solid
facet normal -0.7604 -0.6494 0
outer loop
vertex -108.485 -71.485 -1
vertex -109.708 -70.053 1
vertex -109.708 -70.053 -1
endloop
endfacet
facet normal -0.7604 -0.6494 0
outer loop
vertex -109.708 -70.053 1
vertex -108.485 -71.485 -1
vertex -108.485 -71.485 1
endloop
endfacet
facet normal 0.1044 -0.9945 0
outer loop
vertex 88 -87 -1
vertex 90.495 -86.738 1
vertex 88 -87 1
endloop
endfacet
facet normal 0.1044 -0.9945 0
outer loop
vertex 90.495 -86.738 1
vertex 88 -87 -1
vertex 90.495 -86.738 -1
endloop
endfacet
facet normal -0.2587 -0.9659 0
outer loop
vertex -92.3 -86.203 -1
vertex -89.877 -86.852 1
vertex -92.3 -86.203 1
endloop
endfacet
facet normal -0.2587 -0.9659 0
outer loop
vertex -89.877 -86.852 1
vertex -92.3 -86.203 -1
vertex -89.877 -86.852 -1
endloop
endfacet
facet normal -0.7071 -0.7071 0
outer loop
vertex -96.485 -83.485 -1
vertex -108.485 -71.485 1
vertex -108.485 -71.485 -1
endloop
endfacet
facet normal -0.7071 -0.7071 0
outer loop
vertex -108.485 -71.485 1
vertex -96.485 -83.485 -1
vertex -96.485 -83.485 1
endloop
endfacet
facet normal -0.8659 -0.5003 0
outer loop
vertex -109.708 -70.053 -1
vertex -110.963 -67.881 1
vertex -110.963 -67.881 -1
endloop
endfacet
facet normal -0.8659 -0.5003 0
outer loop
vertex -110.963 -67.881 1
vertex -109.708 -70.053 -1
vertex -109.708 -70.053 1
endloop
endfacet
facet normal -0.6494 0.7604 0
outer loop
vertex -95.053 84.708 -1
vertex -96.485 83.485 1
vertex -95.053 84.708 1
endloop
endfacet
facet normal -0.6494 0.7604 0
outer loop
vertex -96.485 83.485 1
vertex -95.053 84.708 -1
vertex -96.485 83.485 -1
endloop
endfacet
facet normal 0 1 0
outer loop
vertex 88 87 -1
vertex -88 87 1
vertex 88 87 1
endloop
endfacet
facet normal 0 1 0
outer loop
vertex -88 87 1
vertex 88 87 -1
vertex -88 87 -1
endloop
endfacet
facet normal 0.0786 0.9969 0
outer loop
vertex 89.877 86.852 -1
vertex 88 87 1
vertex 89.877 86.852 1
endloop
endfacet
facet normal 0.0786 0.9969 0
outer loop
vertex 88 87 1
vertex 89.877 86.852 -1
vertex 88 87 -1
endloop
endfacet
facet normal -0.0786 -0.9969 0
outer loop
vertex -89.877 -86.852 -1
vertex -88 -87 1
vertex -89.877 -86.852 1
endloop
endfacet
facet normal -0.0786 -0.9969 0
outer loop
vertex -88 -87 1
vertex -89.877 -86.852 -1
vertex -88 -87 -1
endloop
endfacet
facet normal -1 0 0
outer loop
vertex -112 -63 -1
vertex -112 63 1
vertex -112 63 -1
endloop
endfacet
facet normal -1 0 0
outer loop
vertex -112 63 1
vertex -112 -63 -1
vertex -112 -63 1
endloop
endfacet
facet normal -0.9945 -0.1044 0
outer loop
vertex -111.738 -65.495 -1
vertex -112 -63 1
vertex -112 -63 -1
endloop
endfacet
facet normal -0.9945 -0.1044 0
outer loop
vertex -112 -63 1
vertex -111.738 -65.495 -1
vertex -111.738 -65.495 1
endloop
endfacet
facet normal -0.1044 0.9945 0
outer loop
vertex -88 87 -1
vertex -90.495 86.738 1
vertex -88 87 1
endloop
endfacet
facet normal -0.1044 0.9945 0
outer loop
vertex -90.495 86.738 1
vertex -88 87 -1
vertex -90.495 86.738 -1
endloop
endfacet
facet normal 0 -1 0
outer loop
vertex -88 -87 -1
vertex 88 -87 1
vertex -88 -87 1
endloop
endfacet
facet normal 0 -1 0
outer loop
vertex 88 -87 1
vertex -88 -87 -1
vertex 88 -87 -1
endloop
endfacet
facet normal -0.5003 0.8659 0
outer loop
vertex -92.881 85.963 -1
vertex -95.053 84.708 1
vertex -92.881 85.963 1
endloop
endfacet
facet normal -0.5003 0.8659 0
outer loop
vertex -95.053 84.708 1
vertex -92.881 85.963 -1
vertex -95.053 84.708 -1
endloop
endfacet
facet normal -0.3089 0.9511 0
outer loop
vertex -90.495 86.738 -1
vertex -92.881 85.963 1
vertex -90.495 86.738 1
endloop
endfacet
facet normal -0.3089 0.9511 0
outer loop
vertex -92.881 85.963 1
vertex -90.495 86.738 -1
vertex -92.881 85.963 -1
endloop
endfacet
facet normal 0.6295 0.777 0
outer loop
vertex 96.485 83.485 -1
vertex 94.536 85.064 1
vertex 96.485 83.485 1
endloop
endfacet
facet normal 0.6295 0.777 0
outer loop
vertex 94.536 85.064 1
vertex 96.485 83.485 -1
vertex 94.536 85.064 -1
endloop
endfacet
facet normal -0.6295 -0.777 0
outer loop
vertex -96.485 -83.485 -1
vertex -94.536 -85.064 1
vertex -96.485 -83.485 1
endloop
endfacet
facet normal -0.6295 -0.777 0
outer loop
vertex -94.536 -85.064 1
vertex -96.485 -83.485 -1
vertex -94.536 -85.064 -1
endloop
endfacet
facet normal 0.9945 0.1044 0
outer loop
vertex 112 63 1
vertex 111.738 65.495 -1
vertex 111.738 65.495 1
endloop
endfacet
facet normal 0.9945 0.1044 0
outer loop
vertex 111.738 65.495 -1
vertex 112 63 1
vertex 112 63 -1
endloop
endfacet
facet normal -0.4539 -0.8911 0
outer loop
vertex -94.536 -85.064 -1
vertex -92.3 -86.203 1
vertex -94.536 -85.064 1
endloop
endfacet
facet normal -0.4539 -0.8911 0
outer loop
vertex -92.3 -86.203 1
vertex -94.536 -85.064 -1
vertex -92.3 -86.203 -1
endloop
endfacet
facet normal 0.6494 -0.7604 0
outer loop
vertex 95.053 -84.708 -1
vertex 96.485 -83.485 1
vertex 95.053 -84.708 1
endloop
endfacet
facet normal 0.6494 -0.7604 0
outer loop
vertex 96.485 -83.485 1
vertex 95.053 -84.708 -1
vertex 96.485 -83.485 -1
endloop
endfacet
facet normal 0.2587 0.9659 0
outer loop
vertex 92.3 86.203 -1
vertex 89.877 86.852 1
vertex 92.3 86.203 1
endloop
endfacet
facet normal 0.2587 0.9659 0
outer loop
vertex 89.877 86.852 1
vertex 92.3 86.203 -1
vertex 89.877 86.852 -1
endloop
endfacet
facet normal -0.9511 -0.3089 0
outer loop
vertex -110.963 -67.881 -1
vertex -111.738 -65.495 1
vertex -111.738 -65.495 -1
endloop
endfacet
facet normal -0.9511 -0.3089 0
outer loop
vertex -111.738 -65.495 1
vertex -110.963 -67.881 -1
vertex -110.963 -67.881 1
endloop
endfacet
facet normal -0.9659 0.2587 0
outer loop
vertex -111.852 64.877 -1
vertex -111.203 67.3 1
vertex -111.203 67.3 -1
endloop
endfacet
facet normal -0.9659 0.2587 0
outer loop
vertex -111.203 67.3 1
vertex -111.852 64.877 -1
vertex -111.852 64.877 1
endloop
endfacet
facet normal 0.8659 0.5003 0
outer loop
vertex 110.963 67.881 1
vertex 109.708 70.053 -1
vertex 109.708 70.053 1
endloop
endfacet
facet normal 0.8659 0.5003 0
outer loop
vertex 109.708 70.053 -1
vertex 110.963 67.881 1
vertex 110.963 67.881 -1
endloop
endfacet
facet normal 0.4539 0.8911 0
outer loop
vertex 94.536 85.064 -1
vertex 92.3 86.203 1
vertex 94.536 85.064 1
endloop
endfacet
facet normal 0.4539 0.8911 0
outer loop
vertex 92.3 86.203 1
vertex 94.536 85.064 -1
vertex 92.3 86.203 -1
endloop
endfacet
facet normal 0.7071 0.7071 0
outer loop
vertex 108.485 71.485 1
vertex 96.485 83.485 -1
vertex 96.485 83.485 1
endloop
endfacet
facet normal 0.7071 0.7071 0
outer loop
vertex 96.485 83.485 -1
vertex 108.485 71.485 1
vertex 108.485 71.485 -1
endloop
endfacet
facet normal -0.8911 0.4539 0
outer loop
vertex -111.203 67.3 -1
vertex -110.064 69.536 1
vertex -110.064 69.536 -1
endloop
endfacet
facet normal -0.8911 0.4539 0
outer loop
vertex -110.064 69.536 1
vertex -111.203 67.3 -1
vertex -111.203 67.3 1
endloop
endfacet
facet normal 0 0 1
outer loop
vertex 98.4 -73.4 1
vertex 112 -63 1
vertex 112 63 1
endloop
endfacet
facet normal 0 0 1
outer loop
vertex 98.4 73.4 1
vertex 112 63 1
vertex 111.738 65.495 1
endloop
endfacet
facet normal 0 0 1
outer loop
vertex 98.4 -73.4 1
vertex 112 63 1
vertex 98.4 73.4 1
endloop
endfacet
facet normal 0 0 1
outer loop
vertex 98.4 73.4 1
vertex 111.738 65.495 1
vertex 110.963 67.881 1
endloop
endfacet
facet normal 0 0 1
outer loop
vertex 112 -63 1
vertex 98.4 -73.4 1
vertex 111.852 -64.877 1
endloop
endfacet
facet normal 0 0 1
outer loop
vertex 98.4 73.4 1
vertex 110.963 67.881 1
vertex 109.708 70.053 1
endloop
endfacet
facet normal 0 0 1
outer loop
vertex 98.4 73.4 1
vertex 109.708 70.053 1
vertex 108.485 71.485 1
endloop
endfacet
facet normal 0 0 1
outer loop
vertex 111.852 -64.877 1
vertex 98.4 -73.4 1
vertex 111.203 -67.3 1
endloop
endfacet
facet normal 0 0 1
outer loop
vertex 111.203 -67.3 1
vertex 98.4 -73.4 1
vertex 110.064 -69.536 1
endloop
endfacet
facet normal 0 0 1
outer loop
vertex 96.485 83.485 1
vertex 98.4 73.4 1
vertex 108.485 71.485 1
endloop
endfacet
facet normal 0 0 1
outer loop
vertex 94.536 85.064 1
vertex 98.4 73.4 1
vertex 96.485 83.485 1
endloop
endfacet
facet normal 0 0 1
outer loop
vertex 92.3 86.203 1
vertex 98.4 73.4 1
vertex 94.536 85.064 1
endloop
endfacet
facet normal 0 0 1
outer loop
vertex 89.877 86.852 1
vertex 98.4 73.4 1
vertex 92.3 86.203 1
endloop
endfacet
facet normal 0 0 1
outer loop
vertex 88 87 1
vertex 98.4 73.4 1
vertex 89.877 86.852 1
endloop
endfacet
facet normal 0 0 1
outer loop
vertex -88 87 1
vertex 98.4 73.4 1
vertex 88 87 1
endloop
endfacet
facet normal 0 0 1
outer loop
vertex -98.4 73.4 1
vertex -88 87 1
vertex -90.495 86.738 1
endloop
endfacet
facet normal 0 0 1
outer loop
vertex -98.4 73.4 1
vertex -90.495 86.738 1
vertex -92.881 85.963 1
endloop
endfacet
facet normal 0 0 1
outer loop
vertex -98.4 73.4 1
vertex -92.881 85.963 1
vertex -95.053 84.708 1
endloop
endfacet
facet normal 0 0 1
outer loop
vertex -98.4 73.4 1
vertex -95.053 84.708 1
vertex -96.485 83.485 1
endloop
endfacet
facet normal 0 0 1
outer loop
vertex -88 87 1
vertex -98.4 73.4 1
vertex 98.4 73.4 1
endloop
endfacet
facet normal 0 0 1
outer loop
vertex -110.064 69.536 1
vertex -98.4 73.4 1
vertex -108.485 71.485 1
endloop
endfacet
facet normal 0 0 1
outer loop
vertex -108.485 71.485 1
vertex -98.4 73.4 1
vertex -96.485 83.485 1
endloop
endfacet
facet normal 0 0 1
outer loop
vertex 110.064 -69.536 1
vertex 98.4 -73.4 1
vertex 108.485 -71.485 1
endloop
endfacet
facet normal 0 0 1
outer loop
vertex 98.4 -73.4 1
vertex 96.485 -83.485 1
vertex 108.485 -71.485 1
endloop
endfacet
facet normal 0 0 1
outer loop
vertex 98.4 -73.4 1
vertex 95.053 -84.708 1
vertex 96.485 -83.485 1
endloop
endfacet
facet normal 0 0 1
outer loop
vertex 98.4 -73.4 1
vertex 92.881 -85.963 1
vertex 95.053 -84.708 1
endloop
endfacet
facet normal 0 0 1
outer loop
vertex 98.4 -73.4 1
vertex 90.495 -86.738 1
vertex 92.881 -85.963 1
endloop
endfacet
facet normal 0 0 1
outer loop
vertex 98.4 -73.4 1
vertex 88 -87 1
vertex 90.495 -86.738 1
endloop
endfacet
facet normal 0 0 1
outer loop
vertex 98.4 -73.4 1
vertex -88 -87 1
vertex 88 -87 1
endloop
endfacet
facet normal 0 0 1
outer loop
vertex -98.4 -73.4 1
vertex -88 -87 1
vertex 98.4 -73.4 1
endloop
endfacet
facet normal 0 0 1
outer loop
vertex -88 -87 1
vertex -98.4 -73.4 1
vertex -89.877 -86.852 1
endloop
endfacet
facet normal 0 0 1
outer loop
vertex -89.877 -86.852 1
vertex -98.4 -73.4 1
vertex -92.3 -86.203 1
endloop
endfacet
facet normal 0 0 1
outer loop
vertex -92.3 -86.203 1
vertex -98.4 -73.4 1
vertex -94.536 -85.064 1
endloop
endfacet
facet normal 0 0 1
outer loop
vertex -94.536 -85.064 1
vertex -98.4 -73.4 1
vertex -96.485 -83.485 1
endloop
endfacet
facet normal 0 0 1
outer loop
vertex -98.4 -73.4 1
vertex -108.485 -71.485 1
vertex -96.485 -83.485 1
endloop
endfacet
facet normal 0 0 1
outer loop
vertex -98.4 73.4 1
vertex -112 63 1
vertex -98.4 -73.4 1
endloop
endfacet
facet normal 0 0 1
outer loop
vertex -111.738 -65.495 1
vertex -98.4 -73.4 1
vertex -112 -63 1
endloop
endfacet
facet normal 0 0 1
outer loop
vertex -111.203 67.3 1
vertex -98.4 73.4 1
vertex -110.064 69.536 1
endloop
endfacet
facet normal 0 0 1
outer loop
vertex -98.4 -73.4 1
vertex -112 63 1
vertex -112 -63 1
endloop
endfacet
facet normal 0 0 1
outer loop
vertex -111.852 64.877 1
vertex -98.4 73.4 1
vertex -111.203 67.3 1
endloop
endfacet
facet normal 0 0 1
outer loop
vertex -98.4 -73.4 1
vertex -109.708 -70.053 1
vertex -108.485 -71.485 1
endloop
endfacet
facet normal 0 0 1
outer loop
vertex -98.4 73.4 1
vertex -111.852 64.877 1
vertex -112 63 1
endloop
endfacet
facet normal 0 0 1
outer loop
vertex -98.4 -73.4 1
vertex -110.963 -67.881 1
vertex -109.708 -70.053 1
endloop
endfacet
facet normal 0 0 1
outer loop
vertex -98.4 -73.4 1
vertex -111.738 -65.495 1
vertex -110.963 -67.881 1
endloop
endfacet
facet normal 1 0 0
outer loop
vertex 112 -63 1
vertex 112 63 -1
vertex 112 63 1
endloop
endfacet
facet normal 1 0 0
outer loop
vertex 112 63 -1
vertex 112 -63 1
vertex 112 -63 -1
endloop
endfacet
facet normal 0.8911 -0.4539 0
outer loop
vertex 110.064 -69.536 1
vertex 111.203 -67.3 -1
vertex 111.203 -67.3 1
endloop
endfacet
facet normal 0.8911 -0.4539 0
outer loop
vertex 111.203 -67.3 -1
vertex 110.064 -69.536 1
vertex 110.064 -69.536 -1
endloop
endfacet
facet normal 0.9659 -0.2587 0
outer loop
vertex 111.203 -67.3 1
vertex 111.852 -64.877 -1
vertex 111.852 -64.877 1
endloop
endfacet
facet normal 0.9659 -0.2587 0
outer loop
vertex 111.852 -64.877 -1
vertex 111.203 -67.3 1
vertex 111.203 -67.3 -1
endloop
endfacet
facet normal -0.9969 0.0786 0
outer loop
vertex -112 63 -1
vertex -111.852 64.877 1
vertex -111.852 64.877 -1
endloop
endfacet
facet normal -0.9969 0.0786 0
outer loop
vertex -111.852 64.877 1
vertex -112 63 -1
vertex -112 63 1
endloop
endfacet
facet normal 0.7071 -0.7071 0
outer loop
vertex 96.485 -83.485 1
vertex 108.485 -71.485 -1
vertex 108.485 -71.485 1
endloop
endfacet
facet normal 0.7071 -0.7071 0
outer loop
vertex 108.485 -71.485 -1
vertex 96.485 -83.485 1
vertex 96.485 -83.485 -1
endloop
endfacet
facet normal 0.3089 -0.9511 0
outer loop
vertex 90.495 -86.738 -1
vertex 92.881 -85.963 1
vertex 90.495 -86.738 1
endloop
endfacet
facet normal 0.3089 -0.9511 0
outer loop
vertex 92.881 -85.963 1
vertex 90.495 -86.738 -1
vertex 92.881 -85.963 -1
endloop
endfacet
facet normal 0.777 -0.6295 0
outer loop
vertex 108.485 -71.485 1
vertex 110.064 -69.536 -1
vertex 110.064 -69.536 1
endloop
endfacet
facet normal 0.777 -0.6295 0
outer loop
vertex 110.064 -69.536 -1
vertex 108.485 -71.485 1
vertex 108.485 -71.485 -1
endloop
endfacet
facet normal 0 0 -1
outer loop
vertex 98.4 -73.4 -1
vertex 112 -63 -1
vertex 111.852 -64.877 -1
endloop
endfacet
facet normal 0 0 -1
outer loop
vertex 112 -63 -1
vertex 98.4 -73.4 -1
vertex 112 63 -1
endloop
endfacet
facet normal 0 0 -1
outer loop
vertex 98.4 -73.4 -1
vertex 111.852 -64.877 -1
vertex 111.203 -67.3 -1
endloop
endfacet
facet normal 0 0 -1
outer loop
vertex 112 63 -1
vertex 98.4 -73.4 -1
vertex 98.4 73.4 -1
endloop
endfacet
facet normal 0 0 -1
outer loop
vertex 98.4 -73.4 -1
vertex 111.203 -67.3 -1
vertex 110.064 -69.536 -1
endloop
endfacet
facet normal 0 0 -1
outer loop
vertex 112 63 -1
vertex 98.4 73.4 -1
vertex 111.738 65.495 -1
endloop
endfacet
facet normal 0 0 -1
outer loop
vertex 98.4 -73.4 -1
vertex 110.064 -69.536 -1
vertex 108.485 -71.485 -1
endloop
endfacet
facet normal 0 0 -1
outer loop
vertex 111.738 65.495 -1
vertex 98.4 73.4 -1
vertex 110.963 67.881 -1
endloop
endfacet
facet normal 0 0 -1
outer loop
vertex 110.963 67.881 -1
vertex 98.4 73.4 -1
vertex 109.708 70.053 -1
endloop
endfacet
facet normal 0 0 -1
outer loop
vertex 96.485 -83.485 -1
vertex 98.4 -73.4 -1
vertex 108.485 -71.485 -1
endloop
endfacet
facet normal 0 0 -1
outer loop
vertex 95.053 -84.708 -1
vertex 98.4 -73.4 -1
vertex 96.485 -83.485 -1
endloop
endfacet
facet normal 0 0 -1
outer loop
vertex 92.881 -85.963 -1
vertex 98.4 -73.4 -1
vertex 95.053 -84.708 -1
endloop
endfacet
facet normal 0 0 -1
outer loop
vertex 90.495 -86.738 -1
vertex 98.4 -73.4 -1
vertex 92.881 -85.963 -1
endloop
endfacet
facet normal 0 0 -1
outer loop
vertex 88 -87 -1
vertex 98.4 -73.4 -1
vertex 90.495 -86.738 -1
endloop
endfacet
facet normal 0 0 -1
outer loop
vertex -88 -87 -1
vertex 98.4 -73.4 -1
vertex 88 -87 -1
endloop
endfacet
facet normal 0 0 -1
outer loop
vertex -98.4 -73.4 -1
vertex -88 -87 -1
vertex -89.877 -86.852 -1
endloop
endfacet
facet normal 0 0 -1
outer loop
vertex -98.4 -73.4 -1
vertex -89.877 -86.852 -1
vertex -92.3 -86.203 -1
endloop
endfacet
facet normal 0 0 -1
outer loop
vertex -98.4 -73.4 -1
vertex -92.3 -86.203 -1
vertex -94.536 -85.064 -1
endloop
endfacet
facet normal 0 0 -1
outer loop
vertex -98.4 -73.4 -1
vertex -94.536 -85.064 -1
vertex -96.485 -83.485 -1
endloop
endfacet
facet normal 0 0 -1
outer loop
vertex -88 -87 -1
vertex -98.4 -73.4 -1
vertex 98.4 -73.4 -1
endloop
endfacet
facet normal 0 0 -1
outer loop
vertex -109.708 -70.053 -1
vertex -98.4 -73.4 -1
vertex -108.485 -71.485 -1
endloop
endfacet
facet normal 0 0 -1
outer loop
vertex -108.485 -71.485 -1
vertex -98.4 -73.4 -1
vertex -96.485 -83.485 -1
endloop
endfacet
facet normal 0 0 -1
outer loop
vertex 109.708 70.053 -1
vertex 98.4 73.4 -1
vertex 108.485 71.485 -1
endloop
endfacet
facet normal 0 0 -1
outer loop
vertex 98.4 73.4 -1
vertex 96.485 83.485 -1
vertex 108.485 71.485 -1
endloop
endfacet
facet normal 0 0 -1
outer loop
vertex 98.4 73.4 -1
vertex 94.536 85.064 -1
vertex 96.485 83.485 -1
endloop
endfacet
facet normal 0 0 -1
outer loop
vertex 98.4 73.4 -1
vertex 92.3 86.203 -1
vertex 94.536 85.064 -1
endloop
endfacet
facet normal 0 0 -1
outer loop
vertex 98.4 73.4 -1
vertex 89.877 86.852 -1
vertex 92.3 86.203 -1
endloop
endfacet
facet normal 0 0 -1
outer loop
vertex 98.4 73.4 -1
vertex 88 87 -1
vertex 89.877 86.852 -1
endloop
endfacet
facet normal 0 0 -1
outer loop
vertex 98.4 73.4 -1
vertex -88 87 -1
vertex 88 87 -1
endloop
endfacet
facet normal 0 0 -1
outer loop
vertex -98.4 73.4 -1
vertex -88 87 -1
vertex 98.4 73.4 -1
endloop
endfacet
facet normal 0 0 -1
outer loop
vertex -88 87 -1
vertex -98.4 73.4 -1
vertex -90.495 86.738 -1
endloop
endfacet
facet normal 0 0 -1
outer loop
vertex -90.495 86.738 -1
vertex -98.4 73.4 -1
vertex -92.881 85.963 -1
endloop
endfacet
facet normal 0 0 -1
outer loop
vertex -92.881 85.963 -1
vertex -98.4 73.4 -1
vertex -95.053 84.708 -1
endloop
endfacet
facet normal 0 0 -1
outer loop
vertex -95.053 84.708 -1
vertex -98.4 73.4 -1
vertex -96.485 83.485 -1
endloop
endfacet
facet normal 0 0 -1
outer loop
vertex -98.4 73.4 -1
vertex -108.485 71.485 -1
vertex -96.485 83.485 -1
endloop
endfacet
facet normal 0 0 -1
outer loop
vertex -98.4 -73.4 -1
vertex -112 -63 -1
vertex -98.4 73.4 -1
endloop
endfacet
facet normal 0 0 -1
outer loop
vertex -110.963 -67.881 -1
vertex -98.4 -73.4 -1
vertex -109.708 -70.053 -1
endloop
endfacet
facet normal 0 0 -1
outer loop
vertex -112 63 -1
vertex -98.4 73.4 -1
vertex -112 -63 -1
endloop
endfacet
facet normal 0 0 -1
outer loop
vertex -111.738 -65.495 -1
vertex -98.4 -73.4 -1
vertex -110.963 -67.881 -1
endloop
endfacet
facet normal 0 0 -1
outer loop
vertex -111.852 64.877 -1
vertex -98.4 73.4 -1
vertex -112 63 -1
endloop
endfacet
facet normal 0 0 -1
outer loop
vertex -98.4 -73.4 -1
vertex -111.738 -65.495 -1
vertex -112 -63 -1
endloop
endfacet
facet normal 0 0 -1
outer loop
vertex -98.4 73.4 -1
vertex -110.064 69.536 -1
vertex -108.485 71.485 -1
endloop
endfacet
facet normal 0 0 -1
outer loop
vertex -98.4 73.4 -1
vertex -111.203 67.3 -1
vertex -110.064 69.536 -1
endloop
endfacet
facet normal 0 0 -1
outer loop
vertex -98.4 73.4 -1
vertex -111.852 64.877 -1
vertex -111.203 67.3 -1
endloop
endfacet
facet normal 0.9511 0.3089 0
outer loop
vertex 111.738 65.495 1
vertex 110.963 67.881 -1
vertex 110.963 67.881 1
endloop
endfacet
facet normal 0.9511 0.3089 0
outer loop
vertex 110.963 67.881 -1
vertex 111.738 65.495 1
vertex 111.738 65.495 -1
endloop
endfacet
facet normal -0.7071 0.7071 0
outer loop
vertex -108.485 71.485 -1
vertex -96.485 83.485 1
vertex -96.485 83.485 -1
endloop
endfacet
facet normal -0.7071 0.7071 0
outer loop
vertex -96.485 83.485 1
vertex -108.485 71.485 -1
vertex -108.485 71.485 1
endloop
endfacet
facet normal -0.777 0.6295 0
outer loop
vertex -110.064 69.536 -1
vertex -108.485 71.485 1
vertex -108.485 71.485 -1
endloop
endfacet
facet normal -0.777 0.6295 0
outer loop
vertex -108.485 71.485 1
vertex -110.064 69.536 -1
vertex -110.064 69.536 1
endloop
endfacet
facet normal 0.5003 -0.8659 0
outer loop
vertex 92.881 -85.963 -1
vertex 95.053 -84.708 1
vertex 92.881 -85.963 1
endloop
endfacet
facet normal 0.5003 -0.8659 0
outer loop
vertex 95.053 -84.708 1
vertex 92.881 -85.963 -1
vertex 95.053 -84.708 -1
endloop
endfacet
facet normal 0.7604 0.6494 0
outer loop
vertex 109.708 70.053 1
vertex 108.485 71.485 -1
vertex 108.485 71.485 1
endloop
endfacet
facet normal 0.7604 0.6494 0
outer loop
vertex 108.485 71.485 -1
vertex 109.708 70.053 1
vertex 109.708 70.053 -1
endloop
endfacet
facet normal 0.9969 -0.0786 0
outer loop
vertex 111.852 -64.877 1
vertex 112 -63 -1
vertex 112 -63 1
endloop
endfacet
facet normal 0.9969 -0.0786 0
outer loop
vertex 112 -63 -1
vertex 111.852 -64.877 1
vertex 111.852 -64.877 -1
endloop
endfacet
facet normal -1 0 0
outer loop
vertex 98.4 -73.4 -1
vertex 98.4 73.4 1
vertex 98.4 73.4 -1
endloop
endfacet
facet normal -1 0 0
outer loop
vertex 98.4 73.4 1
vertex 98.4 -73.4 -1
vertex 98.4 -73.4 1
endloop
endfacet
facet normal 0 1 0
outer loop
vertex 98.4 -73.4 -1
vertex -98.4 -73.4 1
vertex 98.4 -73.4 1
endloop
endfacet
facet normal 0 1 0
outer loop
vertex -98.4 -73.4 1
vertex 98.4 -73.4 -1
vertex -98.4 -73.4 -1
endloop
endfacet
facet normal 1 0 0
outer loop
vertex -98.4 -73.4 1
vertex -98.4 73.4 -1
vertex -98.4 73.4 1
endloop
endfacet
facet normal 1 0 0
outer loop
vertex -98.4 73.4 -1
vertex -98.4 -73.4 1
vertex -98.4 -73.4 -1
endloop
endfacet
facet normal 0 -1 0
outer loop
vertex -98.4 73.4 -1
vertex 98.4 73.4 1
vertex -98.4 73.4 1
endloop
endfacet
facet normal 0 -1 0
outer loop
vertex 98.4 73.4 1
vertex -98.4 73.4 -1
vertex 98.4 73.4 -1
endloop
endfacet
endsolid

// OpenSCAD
// Parameters
sheet_length = 200; //[100:400:1]
sheet_width = 150; //[75:300:1]
sheet_thickness = 2; //[1:6:0.5]
corner_radius = 12; //[6:24:1]
hole_diameter = 6; //[3:12:0.5]
hole_edge_offset = 15; //[8:30:1]
chamfer_size = 0.8; //[0.3:2:0.1]
overlap = 1; //[0.5:2:0.1]

// Base Shapes
module sheet_body() {
  color("Silver")
  translate([0, 0, 0])
    cube([sheet_length, sheet_width, sheet_thickness], center=true);
}

module rounded_corners() {
  color("Silver")
  translate([0, 0, 0])
    linear_extrude(height=sheet_thickness, center=true)
      offset(r=corner_radius)
        polygon(points=[
          [-sheet_length/2 + corner_radius, -sheet_width/2],
          [sheet_length/2 - corner_radius, -sheet_width/2],
          [sheet_length/2, -sheet_width/2 + corner_radius],
          [sheet_length/2, sheet_width/2 - corner_radius],
          [sheet_length/2 - corner_radius, sheet_width/2],
          [-sheet_length/2 + corner_radius, sheet_width/2],
          [-sheet_length/2, sheet_width/2 - corner_radius],
          [-sheet_length/2, -sheet_width/2 + corner_radius]
        ]);
}

module mounting_hole(position) {
  translate(position)
    cylinder(r=hole_diameter/2, h=sheet_thickness + 2*overlap, center=true);
}

module chamfered_edges() {
  color("Silver")
  translate([0, 0, 0])
    linear_extrude(height=sheet_thickness + 2*overlap, center=true)
      offset(delta=-chamfer_size)
        polygon(points=[
          [-sheet_length/2 + chamfer_size, -sheet_width/2 + chamfer_size],
          [sheet_length/2 - chamfer_size, -sheet_width/2 + chamfer_size],
          [sheet_length/2 - chamfer_size, sheet_width/2 - chamfer_size],
          [-sheet_length/2 + chamfer_size, sheet_width/2 - chamfer_size]
        ]);
}

// Operations
module sheet_outline_union() {
  union() {
    rounded_corners();
    sheet_body();
  }
}

module mounting_holes() {
  union() {
    mounting_hole([-sheet_length/2 + hole_edge_offset, -sheet_width/2 + hole_edge_offset, 0]);
    mounting_hole([sheet_length/2 - hole_edge_offset, -sheet_width/2 + hole_edge_offset, 0]);
    mounting_hole([sheet_length/2 - hole_edge_offset, sheet_width/2 - hole_edge_offset, 0]);
    mounting_hole([-sheet_length/2 + hole_edge_offset, sheet_width/2 - hole_edge_offset, 0]);
  }
}

module sheet_with_holes() {
  difference() {
    sheet_outline_union();
    mounting_holes();
  }
}

module sheet_with_chamfer() {
  difference() {
    sheet_with_holes();
    chamfered_edges();
  }
}

// Final Output
sheet_with_chamfer();
